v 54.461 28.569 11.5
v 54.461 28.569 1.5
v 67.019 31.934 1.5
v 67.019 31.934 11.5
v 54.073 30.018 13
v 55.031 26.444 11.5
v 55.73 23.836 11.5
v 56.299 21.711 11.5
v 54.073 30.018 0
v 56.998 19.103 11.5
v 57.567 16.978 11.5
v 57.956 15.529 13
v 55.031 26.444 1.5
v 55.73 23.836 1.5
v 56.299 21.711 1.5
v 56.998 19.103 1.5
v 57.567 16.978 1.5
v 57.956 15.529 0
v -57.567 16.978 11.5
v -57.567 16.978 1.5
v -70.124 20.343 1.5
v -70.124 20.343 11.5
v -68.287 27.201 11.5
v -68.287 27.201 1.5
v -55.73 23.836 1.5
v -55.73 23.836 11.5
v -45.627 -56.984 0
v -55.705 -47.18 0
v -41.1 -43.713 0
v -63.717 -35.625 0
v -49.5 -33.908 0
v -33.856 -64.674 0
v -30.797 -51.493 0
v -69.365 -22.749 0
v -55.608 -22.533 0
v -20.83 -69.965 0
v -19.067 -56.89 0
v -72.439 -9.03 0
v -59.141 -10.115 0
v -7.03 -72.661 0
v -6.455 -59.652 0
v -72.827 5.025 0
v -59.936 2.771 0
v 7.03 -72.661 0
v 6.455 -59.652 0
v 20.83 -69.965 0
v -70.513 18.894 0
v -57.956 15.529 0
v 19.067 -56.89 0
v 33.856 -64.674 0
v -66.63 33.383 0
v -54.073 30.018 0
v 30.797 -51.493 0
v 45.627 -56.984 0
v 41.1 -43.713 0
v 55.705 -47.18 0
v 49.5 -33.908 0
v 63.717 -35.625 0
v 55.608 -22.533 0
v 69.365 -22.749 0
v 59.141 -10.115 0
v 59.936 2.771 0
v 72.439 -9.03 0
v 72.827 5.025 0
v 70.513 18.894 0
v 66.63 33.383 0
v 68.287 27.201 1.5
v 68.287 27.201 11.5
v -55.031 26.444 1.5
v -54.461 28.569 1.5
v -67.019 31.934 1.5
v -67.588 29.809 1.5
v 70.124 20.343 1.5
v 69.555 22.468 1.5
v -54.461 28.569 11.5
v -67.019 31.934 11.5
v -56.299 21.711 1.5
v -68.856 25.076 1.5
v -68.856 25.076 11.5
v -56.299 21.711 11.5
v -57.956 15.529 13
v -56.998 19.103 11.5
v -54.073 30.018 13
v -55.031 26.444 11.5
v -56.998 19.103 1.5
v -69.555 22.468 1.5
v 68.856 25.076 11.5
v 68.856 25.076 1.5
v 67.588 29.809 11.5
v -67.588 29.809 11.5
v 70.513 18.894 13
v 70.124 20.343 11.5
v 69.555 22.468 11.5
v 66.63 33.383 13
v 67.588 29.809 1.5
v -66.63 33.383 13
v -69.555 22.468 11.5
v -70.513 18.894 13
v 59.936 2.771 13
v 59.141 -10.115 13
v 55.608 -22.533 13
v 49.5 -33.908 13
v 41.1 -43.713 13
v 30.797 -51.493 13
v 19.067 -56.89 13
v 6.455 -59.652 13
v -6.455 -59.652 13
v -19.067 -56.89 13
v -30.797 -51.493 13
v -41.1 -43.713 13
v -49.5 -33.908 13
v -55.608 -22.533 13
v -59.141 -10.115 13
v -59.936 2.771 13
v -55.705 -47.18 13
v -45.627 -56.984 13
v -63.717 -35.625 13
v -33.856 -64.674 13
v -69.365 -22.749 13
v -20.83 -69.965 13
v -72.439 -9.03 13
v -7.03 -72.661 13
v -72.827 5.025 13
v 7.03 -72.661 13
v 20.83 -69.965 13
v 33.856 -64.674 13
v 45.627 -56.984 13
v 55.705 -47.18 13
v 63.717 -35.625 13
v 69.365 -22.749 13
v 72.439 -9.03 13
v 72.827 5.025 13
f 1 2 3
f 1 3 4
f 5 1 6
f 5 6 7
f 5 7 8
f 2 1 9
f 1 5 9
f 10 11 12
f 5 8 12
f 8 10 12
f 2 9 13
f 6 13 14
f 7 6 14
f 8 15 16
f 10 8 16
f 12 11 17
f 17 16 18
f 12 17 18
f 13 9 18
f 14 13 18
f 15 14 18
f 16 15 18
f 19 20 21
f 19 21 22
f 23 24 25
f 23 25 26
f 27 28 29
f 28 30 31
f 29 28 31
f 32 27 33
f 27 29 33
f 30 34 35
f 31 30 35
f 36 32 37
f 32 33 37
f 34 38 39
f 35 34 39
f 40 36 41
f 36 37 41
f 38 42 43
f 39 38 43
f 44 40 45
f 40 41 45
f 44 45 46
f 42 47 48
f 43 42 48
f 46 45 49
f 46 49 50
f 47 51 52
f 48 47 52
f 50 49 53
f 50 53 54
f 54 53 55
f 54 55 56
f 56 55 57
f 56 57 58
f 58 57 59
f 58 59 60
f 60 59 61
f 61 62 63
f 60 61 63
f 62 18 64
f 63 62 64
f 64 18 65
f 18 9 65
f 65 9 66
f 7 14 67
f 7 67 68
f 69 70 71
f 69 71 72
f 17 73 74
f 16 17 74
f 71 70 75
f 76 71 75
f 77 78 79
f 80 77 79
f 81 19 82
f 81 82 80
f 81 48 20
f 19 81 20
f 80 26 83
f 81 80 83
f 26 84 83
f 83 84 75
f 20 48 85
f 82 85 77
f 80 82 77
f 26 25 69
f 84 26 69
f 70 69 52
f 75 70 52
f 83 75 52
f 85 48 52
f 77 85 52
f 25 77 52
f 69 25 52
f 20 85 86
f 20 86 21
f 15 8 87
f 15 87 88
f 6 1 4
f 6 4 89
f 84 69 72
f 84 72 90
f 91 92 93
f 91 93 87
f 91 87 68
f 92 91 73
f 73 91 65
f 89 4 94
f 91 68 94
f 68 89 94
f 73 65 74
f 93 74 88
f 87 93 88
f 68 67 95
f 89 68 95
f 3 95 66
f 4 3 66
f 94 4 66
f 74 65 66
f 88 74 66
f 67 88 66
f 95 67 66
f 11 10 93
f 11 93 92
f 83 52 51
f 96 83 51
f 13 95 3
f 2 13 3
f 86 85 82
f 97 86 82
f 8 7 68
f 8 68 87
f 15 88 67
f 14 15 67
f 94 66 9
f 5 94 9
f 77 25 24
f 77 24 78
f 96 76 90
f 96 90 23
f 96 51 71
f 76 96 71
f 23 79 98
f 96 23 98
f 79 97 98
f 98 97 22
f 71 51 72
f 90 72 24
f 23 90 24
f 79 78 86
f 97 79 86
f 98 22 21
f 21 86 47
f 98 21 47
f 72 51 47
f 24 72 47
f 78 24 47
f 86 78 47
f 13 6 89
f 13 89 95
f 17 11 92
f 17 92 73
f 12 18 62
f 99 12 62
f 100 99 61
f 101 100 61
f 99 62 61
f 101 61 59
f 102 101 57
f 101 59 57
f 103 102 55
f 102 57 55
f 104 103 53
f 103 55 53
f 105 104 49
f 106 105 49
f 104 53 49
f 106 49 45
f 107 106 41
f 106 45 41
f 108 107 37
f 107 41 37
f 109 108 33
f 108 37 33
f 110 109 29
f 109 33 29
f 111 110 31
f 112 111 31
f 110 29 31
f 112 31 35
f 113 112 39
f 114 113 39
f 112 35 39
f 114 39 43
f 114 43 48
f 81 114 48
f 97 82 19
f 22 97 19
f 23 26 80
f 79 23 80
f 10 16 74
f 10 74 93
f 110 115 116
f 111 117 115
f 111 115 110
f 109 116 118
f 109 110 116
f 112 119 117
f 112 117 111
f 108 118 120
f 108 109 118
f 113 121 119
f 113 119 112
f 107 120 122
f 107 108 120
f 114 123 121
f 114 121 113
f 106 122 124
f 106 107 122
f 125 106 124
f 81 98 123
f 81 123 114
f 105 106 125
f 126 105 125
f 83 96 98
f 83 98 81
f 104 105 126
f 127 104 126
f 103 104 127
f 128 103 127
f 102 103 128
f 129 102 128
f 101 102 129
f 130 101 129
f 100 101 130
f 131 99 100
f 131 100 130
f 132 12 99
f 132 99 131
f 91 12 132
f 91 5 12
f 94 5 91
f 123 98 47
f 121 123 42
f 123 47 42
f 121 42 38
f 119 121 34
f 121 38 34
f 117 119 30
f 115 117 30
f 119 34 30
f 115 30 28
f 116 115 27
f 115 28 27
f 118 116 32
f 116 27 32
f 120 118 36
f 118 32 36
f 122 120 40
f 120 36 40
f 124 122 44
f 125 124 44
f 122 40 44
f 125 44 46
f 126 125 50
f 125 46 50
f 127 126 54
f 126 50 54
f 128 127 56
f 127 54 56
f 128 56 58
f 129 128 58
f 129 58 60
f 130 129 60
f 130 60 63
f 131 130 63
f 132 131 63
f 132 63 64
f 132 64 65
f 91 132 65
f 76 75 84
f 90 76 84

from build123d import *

# Parameters (mm, degrees)
F1_DEPTH = 13
F2_W     = 2.2
F2_H     = 3.9
F3_DEPTH = 25
F4_W     = 2.2
F4_H     = 10
F5_DEPTH = 25


with BuildPart() as f1:
    # F0 (on Top) → F1 (new body)
    with BuildSketch(Plane.XY):
        with BuildLine():
            ThreePointArc((57.95555, 15.529143), (0, -60), (-57.95555, 15.529143))
            Line((-57.95555, 15.529143), (-54.073264, 30.01803))
            Line((-54.073264, 30.01803), (-66.6303, 33.382678))
            Line((-66.6303, 33.382678), (-70.512585, 18.89379))
            ThreePointArc((-70.512585, 18.89379), (0, -73), (70.512585, 18.89379))
            Line((70.512585, 18.89379), (66.6303, 33.382678))
            Line((66.6303, 33.382678), (54.073264, 30.01803))
            Line((54.073264, 30.01803), (57.95555, 15.529143))
        make_face()
    extrude(amount=F1_DEPTH)

    # F2 (on face) → F3 (cut)
    with BuildSketch(Plane(origin=(70.512585, 18.89379, 0), x_dir=(-0.258819, 0.965926, 0), z_dir=(0.965926, 0.258819, 0))):
        Polygon((1.5, 11.5), (1.5, 7.6), (1.5, 1.5), (3.7, 1.5), (3.7, 7.6), (3.7, 11.5), align=None)
        Polygon((8.6, 11.5), (6.4, 11.5), (6.4, 7.6), (6.4, 1.5), (8.6, 1.5), (8.6, 7.6), align=None)
        Polygon((13.5, 11.5), (11.3, 11.5), (11.3, 7.6), (11.3, 1.5), (13.5, 1.5), (13.5, 7.6), align=None)
        with Locations((542.279418, 3.45)):
            Rectangle(F2_W, F2_H)
    extrude(amount=-F3_DEPTH, mode=Mode.SUBTRACT)

    # F4 (on face) → F5 (cut)
    with BuildSketch(Plane(origin=(-70.512585, 18.89379, 0), x_dir=(-0.258819, -0.965926, 0), z_dir=(-0.965926, 0.258819, 0))):
        with Locations((-2.6, 6.5)):
            Rectangle(F4_W, F4_H)
        with Locations((-7.5, 6.5)):
            Rectangle(F4_W, F4_H)
        with Locations((-12.4, 6.5)):
            Rectangle(F4_W, F4_H)
    extrude(amount=-F5_DEPTH, mode=Mode.SUBTRACT)


solid = f1.part
